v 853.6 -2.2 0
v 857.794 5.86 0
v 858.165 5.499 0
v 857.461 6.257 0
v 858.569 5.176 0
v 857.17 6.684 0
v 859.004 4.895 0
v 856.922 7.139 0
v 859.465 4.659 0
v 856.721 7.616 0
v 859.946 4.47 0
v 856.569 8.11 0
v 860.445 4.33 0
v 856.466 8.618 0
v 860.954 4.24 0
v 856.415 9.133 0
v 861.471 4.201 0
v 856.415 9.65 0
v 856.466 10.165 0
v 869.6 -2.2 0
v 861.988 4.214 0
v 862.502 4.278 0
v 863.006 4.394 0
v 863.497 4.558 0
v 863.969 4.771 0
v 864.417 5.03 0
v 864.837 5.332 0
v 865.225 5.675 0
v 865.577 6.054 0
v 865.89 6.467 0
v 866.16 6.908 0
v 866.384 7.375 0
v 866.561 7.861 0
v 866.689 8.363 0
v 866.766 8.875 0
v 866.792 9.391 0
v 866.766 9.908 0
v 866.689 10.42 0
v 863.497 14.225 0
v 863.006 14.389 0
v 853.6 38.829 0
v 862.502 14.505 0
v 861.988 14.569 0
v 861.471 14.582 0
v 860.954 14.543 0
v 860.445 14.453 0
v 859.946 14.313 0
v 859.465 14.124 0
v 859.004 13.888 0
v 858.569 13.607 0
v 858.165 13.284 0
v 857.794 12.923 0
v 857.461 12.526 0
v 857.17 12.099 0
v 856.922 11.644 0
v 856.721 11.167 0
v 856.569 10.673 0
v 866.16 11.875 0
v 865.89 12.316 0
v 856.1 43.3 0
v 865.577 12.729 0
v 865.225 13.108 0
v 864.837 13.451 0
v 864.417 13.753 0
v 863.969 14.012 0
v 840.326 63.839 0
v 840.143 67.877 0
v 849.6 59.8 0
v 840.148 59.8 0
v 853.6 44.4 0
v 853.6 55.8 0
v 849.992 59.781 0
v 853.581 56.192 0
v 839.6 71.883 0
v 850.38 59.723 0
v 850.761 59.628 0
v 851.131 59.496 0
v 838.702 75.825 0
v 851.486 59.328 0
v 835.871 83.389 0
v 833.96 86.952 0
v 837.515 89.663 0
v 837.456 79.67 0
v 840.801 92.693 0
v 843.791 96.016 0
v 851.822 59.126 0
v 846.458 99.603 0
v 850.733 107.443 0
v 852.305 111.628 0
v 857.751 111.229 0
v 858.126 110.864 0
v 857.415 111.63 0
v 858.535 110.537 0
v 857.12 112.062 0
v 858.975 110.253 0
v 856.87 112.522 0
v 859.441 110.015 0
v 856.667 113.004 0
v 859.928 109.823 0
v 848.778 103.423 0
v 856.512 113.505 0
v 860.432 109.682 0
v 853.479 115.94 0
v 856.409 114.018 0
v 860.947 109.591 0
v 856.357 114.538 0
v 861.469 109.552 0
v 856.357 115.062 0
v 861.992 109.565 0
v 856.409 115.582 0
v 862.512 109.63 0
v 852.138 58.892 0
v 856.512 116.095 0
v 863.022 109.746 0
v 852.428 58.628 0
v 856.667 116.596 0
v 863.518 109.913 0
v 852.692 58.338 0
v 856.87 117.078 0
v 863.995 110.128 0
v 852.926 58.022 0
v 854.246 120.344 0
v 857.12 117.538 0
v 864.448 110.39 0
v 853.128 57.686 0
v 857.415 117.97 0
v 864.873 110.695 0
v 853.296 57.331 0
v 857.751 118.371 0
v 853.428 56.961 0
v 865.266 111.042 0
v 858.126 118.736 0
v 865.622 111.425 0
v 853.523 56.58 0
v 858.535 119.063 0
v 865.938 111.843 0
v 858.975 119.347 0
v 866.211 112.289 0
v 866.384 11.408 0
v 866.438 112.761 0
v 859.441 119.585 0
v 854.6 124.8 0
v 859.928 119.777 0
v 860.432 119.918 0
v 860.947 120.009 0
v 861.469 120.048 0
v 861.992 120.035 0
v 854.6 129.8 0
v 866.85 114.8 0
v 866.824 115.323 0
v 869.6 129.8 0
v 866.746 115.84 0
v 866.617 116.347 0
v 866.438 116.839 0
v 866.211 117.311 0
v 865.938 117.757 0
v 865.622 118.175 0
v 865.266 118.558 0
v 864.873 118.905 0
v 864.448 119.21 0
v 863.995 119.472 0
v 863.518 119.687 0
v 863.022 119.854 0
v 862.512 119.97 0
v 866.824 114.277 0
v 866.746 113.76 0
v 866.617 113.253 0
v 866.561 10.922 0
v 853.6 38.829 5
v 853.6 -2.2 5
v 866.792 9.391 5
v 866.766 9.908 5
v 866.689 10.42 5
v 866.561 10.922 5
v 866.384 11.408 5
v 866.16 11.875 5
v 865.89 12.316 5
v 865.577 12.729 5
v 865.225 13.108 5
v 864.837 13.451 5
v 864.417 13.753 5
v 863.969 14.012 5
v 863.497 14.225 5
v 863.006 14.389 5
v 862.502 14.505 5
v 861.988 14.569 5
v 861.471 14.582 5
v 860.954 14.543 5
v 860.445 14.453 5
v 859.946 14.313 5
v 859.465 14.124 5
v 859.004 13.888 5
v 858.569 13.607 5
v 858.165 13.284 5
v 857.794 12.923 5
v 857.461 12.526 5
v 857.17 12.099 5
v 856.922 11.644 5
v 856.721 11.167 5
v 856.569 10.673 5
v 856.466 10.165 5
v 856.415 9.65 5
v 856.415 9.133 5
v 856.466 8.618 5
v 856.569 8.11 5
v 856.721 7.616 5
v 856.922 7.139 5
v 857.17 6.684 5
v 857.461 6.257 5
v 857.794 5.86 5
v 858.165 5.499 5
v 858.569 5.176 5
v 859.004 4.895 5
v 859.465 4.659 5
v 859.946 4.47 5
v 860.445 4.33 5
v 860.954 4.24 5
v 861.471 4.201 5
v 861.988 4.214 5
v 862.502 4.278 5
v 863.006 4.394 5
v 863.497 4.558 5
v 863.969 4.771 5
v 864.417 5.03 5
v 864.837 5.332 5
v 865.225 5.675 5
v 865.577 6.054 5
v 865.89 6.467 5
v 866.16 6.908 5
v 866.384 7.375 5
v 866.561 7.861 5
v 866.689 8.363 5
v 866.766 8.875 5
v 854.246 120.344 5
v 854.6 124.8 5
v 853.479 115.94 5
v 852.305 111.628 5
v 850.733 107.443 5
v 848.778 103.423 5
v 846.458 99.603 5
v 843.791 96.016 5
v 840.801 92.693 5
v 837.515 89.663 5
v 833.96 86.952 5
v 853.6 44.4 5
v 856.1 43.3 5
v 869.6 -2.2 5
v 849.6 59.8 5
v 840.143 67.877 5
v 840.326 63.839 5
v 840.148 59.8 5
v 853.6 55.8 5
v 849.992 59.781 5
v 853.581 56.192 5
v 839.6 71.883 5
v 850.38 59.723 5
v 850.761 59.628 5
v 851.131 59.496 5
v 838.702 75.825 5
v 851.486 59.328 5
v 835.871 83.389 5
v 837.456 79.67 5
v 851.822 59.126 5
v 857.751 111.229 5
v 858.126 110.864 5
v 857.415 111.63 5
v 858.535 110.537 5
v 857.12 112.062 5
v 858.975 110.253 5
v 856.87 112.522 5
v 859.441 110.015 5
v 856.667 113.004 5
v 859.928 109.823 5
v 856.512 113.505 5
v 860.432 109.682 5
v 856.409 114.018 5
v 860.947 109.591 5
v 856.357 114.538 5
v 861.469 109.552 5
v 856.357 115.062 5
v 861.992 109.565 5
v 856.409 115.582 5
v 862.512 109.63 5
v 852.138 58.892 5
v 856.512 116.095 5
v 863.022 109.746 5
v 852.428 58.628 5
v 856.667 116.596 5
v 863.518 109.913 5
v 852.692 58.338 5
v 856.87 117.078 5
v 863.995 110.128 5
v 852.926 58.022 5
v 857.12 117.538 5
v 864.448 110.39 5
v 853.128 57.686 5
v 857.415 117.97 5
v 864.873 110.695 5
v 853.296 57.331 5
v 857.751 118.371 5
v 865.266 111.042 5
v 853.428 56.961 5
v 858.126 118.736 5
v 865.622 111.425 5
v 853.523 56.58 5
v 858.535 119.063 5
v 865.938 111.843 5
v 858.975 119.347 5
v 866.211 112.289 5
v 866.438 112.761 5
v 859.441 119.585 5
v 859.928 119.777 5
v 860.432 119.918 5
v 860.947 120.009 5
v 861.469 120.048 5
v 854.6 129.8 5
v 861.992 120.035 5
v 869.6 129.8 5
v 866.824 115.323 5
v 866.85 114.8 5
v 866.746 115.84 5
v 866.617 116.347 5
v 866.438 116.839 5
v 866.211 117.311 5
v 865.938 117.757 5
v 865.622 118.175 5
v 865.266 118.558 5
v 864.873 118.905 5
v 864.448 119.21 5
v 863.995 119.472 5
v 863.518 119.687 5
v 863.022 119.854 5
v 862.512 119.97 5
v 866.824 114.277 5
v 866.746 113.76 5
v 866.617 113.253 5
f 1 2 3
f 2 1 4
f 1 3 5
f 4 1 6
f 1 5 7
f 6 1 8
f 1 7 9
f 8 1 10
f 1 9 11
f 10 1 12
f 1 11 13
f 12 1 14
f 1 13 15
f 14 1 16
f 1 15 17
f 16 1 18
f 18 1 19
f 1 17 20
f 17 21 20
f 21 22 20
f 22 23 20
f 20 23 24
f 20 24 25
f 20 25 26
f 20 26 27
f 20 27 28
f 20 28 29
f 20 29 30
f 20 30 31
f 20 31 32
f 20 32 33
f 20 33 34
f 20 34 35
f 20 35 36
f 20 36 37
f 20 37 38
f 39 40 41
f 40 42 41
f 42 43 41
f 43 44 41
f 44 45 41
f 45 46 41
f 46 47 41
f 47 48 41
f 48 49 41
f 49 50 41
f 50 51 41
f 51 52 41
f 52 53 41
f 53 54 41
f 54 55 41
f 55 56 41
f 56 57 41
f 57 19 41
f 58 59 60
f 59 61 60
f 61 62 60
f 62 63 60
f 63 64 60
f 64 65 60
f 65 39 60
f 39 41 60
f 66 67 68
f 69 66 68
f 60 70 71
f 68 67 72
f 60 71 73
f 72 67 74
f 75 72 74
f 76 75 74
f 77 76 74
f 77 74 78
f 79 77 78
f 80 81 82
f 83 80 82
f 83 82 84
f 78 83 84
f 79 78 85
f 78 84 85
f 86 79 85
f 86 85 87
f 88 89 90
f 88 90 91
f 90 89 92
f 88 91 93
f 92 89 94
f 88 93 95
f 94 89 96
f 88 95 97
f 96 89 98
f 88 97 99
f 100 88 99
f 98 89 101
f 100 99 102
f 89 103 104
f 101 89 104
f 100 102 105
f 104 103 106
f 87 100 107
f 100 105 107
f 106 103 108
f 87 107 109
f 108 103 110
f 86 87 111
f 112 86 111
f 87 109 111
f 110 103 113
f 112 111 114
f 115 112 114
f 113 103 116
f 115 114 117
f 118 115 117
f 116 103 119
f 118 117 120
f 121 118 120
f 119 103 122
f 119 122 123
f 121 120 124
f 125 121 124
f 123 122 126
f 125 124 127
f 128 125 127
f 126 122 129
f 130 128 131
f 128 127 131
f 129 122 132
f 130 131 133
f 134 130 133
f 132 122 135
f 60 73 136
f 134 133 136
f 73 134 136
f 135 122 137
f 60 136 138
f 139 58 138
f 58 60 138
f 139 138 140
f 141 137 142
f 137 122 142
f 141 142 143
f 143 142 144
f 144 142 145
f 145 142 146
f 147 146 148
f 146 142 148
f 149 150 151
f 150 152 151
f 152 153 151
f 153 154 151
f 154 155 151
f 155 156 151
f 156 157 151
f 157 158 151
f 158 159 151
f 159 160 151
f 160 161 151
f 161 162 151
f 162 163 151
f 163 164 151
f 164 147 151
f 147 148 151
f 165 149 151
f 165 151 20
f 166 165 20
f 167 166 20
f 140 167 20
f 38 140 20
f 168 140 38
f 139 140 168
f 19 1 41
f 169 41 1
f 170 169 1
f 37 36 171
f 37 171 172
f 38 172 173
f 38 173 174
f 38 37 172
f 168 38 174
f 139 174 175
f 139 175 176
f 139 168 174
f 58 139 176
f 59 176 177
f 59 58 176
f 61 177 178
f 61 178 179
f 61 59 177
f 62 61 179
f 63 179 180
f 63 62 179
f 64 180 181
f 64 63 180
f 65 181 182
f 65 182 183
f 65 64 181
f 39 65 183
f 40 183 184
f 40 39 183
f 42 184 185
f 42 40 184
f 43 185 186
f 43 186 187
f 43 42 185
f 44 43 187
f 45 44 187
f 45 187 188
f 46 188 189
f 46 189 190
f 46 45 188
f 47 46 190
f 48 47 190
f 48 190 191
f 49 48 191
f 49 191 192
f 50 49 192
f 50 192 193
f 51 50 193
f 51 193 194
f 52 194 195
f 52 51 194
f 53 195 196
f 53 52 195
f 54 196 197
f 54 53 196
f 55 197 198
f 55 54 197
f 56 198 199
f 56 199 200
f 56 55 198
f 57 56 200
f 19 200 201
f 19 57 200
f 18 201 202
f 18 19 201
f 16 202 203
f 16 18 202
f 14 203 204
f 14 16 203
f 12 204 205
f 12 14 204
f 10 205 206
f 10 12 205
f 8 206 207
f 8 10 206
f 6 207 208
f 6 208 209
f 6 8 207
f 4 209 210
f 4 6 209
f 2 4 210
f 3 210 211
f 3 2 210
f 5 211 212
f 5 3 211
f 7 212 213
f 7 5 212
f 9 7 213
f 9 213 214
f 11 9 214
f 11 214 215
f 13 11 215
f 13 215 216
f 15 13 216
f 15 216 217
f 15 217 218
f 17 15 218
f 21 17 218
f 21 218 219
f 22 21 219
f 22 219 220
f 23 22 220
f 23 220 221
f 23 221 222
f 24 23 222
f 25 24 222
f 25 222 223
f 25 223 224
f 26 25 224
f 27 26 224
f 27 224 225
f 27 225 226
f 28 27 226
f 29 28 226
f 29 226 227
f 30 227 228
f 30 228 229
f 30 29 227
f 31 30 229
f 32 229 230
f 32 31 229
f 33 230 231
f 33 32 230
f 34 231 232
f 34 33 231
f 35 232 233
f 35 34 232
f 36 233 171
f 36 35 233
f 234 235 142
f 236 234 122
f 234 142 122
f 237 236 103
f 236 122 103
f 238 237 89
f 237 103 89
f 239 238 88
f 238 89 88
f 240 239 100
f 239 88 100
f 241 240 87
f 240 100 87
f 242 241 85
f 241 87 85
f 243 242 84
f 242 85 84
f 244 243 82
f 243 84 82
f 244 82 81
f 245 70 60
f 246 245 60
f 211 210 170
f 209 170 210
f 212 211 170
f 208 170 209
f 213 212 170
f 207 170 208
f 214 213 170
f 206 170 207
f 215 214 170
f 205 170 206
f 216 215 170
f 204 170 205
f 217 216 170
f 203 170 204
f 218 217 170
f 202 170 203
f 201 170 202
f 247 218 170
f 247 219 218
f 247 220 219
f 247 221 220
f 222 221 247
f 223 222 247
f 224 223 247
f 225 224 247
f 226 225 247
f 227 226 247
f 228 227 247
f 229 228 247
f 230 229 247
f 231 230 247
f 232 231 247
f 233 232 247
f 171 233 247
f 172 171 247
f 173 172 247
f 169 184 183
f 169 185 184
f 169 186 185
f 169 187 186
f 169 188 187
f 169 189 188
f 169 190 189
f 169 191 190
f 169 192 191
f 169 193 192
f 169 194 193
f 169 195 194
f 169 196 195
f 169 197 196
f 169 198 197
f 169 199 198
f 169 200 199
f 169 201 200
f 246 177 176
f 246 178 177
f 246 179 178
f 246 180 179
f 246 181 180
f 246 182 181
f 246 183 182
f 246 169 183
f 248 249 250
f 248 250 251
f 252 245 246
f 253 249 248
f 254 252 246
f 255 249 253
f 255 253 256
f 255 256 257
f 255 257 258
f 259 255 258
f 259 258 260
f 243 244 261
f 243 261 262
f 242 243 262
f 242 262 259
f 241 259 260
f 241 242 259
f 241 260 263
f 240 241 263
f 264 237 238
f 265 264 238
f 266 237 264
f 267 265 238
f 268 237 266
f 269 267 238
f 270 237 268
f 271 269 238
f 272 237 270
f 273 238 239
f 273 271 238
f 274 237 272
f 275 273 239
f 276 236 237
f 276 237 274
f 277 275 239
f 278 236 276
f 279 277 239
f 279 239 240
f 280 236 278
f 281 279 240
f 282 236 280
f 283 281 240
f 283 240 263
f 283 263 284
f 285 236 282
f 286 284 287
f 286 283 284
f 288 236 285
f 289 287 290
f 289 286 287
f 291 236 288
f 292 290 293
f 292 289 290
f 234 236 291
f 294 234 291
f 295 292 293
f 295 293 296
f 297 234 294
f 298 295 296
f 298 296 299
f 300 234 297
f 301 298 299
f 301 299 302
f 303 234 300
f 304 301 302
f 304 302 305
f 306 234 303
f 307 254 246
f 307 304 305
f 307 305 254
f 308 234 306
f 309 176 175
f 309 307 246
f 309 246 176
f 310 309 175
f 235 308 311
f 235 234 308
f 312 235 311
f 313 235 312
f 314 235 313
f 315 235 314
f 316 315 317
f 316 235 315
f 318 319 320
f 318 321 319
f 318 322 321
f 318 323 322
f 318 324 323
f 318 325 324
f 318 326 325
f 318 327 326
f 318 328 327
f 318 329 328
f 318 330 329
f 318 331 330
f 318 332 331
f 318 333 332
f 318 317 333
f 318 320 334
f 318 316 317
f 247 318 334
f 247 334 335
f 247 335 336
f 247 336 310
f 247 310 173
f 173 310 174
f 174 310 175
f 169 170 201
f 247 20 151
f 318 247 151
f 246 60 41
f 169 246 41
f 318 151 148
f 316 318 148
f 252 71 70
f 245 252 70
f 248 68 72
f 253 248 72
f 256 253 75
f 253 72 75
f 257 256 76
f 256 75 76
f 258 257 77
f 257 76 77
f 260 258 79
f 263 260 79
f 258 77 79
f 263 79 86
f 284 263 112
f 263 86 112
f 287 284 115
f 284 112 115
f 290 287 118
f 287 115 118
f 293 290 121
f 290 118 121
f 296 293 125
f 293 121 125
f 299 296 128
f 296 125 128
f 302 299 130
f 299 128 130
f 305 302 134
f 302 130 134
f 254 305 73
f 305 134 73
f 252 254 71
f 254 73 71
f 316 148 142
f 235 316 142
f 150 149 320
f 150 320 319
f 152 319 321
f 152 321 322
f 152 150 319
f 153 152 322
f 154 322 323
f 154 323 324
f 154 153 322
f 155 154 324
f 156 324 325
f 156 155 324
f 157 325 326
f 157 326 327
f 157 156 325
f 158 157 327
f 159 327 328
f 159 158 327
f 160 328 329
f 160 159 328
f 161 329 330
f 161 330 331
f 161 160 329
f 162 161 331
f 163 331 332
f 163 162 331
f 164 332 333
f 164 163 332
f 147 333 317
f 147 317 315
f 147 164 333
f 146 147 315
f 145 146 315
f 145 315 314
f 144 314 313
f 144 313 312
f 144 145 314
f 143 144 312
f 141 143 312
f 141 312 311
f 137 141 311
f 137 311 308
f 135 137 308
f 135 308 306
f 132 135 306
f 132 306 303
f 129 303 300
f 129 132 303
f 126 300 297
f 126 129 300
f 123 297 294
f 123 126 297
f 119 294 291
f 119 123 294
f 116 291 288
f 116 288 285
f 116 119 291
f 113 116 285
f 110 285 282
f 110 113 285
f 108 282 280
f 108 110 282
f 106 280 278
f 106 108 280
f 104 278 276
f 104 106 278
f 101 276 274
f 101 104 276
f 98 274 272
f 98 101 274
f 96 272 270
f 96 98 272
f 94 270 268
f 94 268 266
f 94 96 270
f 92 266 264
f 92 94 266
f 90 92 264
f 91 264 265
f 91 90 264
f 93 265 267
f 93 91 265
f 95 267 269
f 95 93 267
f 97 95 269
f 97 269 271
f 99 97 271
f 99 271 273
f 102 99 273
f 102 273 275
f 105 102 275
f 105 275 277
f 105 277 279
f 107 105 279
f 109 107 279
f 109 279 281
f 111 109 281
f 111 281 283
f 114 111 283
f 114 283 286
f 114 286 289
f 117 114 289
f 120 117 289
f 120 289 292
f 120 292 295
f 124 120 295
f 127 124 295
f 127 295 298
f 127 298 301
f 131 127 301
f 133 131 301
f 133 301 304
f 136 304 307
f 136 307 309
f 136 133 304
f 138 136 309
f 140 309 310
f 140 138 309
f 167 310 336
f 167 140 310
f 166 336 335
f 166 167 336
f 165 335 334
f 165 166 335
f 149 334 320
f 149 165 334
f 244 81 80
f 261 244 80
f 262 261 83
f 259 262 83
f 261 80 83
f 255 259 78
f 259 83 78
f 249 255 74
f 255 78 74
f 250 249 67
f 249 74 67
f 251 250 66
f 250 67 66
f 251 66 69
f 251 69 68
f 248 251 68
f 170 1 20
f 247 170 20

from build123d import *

# Parameters (mm, degrees)
MODEL_R             = 5.191903136
MODEL_R_2           = 5.25
BOSS_EXTRUDE1_DEPTH = 5
SKETCH3_R           = 45.25
CUT_EXTRUDE1_DEPTH  = 6


with BuildPart() as part:
    # Model → Boss-Extrude1 (new body)
    with BuildSketch(Plane.XY):
        with BuildLine():
            Line((869.6, 129.800004709), (854.6, 129.800004709))
            Line((854.6, 129.800004709), (854.6, 124.800004709))
            ThreePointArc((854.6, 124.800004709), (842.940279, 95.005240735), (815.123335737, 79.19718198))
            ThreePointArc((815.123335737, 79.19718198), (819.577050566, 70.004649675), (820.028101645, 59.800004709))
            Line((820.028101645, 59.800004709), (849.60000149, 59.800004709))
            ThreePointArc((849.60000149, 59.800004709), (852.428428615, 58.628431833), (853.60000149, 55.800004709))
            Line((853.60000149, 55.800004709), (853.60000149, 44.400154403))
            Line((853.60000149, 44.400154403), (856.099999799, 43.300004388))
            Line((856.099999799, 43.300004388), (853.60000149, 38.829377357))
            Line((853.60000149, 38.829377357), (853.60000149, -2.199993903))
            Line((853.60000149, -2.199993903), (869.6, -2.199993903))
            Line((869.6, -2.199993903), (869.6, 129.800004709))
        make_face()
        with Locations((861.6, 9.391497171)):
            Circle(MODEL_R, mode=Mode.SUBTRACT)
        with Locations((861.6, 114.800004709)):
            Circle(MODEL_R_2, mode=Mode.SUBTRACT)
    extrude(amount=BOSS_EXTRUDE1_DEPTH)

    # Sketch3 → Cut-Extrude1 (cut)
    with BuildSketch(Plane(origin=(0, 0, 0), x_dir=(-1, 0, 0), z_dir=(0, 0, -1))):
        with Locations((-795.076378777, 63.809415284)):
            Circle(SKETCH3_R)
    extrude(amount=-CUT_EXTRUDE1_DEPTH, mode=Mode.SUBTRACT)


solid = part.part
